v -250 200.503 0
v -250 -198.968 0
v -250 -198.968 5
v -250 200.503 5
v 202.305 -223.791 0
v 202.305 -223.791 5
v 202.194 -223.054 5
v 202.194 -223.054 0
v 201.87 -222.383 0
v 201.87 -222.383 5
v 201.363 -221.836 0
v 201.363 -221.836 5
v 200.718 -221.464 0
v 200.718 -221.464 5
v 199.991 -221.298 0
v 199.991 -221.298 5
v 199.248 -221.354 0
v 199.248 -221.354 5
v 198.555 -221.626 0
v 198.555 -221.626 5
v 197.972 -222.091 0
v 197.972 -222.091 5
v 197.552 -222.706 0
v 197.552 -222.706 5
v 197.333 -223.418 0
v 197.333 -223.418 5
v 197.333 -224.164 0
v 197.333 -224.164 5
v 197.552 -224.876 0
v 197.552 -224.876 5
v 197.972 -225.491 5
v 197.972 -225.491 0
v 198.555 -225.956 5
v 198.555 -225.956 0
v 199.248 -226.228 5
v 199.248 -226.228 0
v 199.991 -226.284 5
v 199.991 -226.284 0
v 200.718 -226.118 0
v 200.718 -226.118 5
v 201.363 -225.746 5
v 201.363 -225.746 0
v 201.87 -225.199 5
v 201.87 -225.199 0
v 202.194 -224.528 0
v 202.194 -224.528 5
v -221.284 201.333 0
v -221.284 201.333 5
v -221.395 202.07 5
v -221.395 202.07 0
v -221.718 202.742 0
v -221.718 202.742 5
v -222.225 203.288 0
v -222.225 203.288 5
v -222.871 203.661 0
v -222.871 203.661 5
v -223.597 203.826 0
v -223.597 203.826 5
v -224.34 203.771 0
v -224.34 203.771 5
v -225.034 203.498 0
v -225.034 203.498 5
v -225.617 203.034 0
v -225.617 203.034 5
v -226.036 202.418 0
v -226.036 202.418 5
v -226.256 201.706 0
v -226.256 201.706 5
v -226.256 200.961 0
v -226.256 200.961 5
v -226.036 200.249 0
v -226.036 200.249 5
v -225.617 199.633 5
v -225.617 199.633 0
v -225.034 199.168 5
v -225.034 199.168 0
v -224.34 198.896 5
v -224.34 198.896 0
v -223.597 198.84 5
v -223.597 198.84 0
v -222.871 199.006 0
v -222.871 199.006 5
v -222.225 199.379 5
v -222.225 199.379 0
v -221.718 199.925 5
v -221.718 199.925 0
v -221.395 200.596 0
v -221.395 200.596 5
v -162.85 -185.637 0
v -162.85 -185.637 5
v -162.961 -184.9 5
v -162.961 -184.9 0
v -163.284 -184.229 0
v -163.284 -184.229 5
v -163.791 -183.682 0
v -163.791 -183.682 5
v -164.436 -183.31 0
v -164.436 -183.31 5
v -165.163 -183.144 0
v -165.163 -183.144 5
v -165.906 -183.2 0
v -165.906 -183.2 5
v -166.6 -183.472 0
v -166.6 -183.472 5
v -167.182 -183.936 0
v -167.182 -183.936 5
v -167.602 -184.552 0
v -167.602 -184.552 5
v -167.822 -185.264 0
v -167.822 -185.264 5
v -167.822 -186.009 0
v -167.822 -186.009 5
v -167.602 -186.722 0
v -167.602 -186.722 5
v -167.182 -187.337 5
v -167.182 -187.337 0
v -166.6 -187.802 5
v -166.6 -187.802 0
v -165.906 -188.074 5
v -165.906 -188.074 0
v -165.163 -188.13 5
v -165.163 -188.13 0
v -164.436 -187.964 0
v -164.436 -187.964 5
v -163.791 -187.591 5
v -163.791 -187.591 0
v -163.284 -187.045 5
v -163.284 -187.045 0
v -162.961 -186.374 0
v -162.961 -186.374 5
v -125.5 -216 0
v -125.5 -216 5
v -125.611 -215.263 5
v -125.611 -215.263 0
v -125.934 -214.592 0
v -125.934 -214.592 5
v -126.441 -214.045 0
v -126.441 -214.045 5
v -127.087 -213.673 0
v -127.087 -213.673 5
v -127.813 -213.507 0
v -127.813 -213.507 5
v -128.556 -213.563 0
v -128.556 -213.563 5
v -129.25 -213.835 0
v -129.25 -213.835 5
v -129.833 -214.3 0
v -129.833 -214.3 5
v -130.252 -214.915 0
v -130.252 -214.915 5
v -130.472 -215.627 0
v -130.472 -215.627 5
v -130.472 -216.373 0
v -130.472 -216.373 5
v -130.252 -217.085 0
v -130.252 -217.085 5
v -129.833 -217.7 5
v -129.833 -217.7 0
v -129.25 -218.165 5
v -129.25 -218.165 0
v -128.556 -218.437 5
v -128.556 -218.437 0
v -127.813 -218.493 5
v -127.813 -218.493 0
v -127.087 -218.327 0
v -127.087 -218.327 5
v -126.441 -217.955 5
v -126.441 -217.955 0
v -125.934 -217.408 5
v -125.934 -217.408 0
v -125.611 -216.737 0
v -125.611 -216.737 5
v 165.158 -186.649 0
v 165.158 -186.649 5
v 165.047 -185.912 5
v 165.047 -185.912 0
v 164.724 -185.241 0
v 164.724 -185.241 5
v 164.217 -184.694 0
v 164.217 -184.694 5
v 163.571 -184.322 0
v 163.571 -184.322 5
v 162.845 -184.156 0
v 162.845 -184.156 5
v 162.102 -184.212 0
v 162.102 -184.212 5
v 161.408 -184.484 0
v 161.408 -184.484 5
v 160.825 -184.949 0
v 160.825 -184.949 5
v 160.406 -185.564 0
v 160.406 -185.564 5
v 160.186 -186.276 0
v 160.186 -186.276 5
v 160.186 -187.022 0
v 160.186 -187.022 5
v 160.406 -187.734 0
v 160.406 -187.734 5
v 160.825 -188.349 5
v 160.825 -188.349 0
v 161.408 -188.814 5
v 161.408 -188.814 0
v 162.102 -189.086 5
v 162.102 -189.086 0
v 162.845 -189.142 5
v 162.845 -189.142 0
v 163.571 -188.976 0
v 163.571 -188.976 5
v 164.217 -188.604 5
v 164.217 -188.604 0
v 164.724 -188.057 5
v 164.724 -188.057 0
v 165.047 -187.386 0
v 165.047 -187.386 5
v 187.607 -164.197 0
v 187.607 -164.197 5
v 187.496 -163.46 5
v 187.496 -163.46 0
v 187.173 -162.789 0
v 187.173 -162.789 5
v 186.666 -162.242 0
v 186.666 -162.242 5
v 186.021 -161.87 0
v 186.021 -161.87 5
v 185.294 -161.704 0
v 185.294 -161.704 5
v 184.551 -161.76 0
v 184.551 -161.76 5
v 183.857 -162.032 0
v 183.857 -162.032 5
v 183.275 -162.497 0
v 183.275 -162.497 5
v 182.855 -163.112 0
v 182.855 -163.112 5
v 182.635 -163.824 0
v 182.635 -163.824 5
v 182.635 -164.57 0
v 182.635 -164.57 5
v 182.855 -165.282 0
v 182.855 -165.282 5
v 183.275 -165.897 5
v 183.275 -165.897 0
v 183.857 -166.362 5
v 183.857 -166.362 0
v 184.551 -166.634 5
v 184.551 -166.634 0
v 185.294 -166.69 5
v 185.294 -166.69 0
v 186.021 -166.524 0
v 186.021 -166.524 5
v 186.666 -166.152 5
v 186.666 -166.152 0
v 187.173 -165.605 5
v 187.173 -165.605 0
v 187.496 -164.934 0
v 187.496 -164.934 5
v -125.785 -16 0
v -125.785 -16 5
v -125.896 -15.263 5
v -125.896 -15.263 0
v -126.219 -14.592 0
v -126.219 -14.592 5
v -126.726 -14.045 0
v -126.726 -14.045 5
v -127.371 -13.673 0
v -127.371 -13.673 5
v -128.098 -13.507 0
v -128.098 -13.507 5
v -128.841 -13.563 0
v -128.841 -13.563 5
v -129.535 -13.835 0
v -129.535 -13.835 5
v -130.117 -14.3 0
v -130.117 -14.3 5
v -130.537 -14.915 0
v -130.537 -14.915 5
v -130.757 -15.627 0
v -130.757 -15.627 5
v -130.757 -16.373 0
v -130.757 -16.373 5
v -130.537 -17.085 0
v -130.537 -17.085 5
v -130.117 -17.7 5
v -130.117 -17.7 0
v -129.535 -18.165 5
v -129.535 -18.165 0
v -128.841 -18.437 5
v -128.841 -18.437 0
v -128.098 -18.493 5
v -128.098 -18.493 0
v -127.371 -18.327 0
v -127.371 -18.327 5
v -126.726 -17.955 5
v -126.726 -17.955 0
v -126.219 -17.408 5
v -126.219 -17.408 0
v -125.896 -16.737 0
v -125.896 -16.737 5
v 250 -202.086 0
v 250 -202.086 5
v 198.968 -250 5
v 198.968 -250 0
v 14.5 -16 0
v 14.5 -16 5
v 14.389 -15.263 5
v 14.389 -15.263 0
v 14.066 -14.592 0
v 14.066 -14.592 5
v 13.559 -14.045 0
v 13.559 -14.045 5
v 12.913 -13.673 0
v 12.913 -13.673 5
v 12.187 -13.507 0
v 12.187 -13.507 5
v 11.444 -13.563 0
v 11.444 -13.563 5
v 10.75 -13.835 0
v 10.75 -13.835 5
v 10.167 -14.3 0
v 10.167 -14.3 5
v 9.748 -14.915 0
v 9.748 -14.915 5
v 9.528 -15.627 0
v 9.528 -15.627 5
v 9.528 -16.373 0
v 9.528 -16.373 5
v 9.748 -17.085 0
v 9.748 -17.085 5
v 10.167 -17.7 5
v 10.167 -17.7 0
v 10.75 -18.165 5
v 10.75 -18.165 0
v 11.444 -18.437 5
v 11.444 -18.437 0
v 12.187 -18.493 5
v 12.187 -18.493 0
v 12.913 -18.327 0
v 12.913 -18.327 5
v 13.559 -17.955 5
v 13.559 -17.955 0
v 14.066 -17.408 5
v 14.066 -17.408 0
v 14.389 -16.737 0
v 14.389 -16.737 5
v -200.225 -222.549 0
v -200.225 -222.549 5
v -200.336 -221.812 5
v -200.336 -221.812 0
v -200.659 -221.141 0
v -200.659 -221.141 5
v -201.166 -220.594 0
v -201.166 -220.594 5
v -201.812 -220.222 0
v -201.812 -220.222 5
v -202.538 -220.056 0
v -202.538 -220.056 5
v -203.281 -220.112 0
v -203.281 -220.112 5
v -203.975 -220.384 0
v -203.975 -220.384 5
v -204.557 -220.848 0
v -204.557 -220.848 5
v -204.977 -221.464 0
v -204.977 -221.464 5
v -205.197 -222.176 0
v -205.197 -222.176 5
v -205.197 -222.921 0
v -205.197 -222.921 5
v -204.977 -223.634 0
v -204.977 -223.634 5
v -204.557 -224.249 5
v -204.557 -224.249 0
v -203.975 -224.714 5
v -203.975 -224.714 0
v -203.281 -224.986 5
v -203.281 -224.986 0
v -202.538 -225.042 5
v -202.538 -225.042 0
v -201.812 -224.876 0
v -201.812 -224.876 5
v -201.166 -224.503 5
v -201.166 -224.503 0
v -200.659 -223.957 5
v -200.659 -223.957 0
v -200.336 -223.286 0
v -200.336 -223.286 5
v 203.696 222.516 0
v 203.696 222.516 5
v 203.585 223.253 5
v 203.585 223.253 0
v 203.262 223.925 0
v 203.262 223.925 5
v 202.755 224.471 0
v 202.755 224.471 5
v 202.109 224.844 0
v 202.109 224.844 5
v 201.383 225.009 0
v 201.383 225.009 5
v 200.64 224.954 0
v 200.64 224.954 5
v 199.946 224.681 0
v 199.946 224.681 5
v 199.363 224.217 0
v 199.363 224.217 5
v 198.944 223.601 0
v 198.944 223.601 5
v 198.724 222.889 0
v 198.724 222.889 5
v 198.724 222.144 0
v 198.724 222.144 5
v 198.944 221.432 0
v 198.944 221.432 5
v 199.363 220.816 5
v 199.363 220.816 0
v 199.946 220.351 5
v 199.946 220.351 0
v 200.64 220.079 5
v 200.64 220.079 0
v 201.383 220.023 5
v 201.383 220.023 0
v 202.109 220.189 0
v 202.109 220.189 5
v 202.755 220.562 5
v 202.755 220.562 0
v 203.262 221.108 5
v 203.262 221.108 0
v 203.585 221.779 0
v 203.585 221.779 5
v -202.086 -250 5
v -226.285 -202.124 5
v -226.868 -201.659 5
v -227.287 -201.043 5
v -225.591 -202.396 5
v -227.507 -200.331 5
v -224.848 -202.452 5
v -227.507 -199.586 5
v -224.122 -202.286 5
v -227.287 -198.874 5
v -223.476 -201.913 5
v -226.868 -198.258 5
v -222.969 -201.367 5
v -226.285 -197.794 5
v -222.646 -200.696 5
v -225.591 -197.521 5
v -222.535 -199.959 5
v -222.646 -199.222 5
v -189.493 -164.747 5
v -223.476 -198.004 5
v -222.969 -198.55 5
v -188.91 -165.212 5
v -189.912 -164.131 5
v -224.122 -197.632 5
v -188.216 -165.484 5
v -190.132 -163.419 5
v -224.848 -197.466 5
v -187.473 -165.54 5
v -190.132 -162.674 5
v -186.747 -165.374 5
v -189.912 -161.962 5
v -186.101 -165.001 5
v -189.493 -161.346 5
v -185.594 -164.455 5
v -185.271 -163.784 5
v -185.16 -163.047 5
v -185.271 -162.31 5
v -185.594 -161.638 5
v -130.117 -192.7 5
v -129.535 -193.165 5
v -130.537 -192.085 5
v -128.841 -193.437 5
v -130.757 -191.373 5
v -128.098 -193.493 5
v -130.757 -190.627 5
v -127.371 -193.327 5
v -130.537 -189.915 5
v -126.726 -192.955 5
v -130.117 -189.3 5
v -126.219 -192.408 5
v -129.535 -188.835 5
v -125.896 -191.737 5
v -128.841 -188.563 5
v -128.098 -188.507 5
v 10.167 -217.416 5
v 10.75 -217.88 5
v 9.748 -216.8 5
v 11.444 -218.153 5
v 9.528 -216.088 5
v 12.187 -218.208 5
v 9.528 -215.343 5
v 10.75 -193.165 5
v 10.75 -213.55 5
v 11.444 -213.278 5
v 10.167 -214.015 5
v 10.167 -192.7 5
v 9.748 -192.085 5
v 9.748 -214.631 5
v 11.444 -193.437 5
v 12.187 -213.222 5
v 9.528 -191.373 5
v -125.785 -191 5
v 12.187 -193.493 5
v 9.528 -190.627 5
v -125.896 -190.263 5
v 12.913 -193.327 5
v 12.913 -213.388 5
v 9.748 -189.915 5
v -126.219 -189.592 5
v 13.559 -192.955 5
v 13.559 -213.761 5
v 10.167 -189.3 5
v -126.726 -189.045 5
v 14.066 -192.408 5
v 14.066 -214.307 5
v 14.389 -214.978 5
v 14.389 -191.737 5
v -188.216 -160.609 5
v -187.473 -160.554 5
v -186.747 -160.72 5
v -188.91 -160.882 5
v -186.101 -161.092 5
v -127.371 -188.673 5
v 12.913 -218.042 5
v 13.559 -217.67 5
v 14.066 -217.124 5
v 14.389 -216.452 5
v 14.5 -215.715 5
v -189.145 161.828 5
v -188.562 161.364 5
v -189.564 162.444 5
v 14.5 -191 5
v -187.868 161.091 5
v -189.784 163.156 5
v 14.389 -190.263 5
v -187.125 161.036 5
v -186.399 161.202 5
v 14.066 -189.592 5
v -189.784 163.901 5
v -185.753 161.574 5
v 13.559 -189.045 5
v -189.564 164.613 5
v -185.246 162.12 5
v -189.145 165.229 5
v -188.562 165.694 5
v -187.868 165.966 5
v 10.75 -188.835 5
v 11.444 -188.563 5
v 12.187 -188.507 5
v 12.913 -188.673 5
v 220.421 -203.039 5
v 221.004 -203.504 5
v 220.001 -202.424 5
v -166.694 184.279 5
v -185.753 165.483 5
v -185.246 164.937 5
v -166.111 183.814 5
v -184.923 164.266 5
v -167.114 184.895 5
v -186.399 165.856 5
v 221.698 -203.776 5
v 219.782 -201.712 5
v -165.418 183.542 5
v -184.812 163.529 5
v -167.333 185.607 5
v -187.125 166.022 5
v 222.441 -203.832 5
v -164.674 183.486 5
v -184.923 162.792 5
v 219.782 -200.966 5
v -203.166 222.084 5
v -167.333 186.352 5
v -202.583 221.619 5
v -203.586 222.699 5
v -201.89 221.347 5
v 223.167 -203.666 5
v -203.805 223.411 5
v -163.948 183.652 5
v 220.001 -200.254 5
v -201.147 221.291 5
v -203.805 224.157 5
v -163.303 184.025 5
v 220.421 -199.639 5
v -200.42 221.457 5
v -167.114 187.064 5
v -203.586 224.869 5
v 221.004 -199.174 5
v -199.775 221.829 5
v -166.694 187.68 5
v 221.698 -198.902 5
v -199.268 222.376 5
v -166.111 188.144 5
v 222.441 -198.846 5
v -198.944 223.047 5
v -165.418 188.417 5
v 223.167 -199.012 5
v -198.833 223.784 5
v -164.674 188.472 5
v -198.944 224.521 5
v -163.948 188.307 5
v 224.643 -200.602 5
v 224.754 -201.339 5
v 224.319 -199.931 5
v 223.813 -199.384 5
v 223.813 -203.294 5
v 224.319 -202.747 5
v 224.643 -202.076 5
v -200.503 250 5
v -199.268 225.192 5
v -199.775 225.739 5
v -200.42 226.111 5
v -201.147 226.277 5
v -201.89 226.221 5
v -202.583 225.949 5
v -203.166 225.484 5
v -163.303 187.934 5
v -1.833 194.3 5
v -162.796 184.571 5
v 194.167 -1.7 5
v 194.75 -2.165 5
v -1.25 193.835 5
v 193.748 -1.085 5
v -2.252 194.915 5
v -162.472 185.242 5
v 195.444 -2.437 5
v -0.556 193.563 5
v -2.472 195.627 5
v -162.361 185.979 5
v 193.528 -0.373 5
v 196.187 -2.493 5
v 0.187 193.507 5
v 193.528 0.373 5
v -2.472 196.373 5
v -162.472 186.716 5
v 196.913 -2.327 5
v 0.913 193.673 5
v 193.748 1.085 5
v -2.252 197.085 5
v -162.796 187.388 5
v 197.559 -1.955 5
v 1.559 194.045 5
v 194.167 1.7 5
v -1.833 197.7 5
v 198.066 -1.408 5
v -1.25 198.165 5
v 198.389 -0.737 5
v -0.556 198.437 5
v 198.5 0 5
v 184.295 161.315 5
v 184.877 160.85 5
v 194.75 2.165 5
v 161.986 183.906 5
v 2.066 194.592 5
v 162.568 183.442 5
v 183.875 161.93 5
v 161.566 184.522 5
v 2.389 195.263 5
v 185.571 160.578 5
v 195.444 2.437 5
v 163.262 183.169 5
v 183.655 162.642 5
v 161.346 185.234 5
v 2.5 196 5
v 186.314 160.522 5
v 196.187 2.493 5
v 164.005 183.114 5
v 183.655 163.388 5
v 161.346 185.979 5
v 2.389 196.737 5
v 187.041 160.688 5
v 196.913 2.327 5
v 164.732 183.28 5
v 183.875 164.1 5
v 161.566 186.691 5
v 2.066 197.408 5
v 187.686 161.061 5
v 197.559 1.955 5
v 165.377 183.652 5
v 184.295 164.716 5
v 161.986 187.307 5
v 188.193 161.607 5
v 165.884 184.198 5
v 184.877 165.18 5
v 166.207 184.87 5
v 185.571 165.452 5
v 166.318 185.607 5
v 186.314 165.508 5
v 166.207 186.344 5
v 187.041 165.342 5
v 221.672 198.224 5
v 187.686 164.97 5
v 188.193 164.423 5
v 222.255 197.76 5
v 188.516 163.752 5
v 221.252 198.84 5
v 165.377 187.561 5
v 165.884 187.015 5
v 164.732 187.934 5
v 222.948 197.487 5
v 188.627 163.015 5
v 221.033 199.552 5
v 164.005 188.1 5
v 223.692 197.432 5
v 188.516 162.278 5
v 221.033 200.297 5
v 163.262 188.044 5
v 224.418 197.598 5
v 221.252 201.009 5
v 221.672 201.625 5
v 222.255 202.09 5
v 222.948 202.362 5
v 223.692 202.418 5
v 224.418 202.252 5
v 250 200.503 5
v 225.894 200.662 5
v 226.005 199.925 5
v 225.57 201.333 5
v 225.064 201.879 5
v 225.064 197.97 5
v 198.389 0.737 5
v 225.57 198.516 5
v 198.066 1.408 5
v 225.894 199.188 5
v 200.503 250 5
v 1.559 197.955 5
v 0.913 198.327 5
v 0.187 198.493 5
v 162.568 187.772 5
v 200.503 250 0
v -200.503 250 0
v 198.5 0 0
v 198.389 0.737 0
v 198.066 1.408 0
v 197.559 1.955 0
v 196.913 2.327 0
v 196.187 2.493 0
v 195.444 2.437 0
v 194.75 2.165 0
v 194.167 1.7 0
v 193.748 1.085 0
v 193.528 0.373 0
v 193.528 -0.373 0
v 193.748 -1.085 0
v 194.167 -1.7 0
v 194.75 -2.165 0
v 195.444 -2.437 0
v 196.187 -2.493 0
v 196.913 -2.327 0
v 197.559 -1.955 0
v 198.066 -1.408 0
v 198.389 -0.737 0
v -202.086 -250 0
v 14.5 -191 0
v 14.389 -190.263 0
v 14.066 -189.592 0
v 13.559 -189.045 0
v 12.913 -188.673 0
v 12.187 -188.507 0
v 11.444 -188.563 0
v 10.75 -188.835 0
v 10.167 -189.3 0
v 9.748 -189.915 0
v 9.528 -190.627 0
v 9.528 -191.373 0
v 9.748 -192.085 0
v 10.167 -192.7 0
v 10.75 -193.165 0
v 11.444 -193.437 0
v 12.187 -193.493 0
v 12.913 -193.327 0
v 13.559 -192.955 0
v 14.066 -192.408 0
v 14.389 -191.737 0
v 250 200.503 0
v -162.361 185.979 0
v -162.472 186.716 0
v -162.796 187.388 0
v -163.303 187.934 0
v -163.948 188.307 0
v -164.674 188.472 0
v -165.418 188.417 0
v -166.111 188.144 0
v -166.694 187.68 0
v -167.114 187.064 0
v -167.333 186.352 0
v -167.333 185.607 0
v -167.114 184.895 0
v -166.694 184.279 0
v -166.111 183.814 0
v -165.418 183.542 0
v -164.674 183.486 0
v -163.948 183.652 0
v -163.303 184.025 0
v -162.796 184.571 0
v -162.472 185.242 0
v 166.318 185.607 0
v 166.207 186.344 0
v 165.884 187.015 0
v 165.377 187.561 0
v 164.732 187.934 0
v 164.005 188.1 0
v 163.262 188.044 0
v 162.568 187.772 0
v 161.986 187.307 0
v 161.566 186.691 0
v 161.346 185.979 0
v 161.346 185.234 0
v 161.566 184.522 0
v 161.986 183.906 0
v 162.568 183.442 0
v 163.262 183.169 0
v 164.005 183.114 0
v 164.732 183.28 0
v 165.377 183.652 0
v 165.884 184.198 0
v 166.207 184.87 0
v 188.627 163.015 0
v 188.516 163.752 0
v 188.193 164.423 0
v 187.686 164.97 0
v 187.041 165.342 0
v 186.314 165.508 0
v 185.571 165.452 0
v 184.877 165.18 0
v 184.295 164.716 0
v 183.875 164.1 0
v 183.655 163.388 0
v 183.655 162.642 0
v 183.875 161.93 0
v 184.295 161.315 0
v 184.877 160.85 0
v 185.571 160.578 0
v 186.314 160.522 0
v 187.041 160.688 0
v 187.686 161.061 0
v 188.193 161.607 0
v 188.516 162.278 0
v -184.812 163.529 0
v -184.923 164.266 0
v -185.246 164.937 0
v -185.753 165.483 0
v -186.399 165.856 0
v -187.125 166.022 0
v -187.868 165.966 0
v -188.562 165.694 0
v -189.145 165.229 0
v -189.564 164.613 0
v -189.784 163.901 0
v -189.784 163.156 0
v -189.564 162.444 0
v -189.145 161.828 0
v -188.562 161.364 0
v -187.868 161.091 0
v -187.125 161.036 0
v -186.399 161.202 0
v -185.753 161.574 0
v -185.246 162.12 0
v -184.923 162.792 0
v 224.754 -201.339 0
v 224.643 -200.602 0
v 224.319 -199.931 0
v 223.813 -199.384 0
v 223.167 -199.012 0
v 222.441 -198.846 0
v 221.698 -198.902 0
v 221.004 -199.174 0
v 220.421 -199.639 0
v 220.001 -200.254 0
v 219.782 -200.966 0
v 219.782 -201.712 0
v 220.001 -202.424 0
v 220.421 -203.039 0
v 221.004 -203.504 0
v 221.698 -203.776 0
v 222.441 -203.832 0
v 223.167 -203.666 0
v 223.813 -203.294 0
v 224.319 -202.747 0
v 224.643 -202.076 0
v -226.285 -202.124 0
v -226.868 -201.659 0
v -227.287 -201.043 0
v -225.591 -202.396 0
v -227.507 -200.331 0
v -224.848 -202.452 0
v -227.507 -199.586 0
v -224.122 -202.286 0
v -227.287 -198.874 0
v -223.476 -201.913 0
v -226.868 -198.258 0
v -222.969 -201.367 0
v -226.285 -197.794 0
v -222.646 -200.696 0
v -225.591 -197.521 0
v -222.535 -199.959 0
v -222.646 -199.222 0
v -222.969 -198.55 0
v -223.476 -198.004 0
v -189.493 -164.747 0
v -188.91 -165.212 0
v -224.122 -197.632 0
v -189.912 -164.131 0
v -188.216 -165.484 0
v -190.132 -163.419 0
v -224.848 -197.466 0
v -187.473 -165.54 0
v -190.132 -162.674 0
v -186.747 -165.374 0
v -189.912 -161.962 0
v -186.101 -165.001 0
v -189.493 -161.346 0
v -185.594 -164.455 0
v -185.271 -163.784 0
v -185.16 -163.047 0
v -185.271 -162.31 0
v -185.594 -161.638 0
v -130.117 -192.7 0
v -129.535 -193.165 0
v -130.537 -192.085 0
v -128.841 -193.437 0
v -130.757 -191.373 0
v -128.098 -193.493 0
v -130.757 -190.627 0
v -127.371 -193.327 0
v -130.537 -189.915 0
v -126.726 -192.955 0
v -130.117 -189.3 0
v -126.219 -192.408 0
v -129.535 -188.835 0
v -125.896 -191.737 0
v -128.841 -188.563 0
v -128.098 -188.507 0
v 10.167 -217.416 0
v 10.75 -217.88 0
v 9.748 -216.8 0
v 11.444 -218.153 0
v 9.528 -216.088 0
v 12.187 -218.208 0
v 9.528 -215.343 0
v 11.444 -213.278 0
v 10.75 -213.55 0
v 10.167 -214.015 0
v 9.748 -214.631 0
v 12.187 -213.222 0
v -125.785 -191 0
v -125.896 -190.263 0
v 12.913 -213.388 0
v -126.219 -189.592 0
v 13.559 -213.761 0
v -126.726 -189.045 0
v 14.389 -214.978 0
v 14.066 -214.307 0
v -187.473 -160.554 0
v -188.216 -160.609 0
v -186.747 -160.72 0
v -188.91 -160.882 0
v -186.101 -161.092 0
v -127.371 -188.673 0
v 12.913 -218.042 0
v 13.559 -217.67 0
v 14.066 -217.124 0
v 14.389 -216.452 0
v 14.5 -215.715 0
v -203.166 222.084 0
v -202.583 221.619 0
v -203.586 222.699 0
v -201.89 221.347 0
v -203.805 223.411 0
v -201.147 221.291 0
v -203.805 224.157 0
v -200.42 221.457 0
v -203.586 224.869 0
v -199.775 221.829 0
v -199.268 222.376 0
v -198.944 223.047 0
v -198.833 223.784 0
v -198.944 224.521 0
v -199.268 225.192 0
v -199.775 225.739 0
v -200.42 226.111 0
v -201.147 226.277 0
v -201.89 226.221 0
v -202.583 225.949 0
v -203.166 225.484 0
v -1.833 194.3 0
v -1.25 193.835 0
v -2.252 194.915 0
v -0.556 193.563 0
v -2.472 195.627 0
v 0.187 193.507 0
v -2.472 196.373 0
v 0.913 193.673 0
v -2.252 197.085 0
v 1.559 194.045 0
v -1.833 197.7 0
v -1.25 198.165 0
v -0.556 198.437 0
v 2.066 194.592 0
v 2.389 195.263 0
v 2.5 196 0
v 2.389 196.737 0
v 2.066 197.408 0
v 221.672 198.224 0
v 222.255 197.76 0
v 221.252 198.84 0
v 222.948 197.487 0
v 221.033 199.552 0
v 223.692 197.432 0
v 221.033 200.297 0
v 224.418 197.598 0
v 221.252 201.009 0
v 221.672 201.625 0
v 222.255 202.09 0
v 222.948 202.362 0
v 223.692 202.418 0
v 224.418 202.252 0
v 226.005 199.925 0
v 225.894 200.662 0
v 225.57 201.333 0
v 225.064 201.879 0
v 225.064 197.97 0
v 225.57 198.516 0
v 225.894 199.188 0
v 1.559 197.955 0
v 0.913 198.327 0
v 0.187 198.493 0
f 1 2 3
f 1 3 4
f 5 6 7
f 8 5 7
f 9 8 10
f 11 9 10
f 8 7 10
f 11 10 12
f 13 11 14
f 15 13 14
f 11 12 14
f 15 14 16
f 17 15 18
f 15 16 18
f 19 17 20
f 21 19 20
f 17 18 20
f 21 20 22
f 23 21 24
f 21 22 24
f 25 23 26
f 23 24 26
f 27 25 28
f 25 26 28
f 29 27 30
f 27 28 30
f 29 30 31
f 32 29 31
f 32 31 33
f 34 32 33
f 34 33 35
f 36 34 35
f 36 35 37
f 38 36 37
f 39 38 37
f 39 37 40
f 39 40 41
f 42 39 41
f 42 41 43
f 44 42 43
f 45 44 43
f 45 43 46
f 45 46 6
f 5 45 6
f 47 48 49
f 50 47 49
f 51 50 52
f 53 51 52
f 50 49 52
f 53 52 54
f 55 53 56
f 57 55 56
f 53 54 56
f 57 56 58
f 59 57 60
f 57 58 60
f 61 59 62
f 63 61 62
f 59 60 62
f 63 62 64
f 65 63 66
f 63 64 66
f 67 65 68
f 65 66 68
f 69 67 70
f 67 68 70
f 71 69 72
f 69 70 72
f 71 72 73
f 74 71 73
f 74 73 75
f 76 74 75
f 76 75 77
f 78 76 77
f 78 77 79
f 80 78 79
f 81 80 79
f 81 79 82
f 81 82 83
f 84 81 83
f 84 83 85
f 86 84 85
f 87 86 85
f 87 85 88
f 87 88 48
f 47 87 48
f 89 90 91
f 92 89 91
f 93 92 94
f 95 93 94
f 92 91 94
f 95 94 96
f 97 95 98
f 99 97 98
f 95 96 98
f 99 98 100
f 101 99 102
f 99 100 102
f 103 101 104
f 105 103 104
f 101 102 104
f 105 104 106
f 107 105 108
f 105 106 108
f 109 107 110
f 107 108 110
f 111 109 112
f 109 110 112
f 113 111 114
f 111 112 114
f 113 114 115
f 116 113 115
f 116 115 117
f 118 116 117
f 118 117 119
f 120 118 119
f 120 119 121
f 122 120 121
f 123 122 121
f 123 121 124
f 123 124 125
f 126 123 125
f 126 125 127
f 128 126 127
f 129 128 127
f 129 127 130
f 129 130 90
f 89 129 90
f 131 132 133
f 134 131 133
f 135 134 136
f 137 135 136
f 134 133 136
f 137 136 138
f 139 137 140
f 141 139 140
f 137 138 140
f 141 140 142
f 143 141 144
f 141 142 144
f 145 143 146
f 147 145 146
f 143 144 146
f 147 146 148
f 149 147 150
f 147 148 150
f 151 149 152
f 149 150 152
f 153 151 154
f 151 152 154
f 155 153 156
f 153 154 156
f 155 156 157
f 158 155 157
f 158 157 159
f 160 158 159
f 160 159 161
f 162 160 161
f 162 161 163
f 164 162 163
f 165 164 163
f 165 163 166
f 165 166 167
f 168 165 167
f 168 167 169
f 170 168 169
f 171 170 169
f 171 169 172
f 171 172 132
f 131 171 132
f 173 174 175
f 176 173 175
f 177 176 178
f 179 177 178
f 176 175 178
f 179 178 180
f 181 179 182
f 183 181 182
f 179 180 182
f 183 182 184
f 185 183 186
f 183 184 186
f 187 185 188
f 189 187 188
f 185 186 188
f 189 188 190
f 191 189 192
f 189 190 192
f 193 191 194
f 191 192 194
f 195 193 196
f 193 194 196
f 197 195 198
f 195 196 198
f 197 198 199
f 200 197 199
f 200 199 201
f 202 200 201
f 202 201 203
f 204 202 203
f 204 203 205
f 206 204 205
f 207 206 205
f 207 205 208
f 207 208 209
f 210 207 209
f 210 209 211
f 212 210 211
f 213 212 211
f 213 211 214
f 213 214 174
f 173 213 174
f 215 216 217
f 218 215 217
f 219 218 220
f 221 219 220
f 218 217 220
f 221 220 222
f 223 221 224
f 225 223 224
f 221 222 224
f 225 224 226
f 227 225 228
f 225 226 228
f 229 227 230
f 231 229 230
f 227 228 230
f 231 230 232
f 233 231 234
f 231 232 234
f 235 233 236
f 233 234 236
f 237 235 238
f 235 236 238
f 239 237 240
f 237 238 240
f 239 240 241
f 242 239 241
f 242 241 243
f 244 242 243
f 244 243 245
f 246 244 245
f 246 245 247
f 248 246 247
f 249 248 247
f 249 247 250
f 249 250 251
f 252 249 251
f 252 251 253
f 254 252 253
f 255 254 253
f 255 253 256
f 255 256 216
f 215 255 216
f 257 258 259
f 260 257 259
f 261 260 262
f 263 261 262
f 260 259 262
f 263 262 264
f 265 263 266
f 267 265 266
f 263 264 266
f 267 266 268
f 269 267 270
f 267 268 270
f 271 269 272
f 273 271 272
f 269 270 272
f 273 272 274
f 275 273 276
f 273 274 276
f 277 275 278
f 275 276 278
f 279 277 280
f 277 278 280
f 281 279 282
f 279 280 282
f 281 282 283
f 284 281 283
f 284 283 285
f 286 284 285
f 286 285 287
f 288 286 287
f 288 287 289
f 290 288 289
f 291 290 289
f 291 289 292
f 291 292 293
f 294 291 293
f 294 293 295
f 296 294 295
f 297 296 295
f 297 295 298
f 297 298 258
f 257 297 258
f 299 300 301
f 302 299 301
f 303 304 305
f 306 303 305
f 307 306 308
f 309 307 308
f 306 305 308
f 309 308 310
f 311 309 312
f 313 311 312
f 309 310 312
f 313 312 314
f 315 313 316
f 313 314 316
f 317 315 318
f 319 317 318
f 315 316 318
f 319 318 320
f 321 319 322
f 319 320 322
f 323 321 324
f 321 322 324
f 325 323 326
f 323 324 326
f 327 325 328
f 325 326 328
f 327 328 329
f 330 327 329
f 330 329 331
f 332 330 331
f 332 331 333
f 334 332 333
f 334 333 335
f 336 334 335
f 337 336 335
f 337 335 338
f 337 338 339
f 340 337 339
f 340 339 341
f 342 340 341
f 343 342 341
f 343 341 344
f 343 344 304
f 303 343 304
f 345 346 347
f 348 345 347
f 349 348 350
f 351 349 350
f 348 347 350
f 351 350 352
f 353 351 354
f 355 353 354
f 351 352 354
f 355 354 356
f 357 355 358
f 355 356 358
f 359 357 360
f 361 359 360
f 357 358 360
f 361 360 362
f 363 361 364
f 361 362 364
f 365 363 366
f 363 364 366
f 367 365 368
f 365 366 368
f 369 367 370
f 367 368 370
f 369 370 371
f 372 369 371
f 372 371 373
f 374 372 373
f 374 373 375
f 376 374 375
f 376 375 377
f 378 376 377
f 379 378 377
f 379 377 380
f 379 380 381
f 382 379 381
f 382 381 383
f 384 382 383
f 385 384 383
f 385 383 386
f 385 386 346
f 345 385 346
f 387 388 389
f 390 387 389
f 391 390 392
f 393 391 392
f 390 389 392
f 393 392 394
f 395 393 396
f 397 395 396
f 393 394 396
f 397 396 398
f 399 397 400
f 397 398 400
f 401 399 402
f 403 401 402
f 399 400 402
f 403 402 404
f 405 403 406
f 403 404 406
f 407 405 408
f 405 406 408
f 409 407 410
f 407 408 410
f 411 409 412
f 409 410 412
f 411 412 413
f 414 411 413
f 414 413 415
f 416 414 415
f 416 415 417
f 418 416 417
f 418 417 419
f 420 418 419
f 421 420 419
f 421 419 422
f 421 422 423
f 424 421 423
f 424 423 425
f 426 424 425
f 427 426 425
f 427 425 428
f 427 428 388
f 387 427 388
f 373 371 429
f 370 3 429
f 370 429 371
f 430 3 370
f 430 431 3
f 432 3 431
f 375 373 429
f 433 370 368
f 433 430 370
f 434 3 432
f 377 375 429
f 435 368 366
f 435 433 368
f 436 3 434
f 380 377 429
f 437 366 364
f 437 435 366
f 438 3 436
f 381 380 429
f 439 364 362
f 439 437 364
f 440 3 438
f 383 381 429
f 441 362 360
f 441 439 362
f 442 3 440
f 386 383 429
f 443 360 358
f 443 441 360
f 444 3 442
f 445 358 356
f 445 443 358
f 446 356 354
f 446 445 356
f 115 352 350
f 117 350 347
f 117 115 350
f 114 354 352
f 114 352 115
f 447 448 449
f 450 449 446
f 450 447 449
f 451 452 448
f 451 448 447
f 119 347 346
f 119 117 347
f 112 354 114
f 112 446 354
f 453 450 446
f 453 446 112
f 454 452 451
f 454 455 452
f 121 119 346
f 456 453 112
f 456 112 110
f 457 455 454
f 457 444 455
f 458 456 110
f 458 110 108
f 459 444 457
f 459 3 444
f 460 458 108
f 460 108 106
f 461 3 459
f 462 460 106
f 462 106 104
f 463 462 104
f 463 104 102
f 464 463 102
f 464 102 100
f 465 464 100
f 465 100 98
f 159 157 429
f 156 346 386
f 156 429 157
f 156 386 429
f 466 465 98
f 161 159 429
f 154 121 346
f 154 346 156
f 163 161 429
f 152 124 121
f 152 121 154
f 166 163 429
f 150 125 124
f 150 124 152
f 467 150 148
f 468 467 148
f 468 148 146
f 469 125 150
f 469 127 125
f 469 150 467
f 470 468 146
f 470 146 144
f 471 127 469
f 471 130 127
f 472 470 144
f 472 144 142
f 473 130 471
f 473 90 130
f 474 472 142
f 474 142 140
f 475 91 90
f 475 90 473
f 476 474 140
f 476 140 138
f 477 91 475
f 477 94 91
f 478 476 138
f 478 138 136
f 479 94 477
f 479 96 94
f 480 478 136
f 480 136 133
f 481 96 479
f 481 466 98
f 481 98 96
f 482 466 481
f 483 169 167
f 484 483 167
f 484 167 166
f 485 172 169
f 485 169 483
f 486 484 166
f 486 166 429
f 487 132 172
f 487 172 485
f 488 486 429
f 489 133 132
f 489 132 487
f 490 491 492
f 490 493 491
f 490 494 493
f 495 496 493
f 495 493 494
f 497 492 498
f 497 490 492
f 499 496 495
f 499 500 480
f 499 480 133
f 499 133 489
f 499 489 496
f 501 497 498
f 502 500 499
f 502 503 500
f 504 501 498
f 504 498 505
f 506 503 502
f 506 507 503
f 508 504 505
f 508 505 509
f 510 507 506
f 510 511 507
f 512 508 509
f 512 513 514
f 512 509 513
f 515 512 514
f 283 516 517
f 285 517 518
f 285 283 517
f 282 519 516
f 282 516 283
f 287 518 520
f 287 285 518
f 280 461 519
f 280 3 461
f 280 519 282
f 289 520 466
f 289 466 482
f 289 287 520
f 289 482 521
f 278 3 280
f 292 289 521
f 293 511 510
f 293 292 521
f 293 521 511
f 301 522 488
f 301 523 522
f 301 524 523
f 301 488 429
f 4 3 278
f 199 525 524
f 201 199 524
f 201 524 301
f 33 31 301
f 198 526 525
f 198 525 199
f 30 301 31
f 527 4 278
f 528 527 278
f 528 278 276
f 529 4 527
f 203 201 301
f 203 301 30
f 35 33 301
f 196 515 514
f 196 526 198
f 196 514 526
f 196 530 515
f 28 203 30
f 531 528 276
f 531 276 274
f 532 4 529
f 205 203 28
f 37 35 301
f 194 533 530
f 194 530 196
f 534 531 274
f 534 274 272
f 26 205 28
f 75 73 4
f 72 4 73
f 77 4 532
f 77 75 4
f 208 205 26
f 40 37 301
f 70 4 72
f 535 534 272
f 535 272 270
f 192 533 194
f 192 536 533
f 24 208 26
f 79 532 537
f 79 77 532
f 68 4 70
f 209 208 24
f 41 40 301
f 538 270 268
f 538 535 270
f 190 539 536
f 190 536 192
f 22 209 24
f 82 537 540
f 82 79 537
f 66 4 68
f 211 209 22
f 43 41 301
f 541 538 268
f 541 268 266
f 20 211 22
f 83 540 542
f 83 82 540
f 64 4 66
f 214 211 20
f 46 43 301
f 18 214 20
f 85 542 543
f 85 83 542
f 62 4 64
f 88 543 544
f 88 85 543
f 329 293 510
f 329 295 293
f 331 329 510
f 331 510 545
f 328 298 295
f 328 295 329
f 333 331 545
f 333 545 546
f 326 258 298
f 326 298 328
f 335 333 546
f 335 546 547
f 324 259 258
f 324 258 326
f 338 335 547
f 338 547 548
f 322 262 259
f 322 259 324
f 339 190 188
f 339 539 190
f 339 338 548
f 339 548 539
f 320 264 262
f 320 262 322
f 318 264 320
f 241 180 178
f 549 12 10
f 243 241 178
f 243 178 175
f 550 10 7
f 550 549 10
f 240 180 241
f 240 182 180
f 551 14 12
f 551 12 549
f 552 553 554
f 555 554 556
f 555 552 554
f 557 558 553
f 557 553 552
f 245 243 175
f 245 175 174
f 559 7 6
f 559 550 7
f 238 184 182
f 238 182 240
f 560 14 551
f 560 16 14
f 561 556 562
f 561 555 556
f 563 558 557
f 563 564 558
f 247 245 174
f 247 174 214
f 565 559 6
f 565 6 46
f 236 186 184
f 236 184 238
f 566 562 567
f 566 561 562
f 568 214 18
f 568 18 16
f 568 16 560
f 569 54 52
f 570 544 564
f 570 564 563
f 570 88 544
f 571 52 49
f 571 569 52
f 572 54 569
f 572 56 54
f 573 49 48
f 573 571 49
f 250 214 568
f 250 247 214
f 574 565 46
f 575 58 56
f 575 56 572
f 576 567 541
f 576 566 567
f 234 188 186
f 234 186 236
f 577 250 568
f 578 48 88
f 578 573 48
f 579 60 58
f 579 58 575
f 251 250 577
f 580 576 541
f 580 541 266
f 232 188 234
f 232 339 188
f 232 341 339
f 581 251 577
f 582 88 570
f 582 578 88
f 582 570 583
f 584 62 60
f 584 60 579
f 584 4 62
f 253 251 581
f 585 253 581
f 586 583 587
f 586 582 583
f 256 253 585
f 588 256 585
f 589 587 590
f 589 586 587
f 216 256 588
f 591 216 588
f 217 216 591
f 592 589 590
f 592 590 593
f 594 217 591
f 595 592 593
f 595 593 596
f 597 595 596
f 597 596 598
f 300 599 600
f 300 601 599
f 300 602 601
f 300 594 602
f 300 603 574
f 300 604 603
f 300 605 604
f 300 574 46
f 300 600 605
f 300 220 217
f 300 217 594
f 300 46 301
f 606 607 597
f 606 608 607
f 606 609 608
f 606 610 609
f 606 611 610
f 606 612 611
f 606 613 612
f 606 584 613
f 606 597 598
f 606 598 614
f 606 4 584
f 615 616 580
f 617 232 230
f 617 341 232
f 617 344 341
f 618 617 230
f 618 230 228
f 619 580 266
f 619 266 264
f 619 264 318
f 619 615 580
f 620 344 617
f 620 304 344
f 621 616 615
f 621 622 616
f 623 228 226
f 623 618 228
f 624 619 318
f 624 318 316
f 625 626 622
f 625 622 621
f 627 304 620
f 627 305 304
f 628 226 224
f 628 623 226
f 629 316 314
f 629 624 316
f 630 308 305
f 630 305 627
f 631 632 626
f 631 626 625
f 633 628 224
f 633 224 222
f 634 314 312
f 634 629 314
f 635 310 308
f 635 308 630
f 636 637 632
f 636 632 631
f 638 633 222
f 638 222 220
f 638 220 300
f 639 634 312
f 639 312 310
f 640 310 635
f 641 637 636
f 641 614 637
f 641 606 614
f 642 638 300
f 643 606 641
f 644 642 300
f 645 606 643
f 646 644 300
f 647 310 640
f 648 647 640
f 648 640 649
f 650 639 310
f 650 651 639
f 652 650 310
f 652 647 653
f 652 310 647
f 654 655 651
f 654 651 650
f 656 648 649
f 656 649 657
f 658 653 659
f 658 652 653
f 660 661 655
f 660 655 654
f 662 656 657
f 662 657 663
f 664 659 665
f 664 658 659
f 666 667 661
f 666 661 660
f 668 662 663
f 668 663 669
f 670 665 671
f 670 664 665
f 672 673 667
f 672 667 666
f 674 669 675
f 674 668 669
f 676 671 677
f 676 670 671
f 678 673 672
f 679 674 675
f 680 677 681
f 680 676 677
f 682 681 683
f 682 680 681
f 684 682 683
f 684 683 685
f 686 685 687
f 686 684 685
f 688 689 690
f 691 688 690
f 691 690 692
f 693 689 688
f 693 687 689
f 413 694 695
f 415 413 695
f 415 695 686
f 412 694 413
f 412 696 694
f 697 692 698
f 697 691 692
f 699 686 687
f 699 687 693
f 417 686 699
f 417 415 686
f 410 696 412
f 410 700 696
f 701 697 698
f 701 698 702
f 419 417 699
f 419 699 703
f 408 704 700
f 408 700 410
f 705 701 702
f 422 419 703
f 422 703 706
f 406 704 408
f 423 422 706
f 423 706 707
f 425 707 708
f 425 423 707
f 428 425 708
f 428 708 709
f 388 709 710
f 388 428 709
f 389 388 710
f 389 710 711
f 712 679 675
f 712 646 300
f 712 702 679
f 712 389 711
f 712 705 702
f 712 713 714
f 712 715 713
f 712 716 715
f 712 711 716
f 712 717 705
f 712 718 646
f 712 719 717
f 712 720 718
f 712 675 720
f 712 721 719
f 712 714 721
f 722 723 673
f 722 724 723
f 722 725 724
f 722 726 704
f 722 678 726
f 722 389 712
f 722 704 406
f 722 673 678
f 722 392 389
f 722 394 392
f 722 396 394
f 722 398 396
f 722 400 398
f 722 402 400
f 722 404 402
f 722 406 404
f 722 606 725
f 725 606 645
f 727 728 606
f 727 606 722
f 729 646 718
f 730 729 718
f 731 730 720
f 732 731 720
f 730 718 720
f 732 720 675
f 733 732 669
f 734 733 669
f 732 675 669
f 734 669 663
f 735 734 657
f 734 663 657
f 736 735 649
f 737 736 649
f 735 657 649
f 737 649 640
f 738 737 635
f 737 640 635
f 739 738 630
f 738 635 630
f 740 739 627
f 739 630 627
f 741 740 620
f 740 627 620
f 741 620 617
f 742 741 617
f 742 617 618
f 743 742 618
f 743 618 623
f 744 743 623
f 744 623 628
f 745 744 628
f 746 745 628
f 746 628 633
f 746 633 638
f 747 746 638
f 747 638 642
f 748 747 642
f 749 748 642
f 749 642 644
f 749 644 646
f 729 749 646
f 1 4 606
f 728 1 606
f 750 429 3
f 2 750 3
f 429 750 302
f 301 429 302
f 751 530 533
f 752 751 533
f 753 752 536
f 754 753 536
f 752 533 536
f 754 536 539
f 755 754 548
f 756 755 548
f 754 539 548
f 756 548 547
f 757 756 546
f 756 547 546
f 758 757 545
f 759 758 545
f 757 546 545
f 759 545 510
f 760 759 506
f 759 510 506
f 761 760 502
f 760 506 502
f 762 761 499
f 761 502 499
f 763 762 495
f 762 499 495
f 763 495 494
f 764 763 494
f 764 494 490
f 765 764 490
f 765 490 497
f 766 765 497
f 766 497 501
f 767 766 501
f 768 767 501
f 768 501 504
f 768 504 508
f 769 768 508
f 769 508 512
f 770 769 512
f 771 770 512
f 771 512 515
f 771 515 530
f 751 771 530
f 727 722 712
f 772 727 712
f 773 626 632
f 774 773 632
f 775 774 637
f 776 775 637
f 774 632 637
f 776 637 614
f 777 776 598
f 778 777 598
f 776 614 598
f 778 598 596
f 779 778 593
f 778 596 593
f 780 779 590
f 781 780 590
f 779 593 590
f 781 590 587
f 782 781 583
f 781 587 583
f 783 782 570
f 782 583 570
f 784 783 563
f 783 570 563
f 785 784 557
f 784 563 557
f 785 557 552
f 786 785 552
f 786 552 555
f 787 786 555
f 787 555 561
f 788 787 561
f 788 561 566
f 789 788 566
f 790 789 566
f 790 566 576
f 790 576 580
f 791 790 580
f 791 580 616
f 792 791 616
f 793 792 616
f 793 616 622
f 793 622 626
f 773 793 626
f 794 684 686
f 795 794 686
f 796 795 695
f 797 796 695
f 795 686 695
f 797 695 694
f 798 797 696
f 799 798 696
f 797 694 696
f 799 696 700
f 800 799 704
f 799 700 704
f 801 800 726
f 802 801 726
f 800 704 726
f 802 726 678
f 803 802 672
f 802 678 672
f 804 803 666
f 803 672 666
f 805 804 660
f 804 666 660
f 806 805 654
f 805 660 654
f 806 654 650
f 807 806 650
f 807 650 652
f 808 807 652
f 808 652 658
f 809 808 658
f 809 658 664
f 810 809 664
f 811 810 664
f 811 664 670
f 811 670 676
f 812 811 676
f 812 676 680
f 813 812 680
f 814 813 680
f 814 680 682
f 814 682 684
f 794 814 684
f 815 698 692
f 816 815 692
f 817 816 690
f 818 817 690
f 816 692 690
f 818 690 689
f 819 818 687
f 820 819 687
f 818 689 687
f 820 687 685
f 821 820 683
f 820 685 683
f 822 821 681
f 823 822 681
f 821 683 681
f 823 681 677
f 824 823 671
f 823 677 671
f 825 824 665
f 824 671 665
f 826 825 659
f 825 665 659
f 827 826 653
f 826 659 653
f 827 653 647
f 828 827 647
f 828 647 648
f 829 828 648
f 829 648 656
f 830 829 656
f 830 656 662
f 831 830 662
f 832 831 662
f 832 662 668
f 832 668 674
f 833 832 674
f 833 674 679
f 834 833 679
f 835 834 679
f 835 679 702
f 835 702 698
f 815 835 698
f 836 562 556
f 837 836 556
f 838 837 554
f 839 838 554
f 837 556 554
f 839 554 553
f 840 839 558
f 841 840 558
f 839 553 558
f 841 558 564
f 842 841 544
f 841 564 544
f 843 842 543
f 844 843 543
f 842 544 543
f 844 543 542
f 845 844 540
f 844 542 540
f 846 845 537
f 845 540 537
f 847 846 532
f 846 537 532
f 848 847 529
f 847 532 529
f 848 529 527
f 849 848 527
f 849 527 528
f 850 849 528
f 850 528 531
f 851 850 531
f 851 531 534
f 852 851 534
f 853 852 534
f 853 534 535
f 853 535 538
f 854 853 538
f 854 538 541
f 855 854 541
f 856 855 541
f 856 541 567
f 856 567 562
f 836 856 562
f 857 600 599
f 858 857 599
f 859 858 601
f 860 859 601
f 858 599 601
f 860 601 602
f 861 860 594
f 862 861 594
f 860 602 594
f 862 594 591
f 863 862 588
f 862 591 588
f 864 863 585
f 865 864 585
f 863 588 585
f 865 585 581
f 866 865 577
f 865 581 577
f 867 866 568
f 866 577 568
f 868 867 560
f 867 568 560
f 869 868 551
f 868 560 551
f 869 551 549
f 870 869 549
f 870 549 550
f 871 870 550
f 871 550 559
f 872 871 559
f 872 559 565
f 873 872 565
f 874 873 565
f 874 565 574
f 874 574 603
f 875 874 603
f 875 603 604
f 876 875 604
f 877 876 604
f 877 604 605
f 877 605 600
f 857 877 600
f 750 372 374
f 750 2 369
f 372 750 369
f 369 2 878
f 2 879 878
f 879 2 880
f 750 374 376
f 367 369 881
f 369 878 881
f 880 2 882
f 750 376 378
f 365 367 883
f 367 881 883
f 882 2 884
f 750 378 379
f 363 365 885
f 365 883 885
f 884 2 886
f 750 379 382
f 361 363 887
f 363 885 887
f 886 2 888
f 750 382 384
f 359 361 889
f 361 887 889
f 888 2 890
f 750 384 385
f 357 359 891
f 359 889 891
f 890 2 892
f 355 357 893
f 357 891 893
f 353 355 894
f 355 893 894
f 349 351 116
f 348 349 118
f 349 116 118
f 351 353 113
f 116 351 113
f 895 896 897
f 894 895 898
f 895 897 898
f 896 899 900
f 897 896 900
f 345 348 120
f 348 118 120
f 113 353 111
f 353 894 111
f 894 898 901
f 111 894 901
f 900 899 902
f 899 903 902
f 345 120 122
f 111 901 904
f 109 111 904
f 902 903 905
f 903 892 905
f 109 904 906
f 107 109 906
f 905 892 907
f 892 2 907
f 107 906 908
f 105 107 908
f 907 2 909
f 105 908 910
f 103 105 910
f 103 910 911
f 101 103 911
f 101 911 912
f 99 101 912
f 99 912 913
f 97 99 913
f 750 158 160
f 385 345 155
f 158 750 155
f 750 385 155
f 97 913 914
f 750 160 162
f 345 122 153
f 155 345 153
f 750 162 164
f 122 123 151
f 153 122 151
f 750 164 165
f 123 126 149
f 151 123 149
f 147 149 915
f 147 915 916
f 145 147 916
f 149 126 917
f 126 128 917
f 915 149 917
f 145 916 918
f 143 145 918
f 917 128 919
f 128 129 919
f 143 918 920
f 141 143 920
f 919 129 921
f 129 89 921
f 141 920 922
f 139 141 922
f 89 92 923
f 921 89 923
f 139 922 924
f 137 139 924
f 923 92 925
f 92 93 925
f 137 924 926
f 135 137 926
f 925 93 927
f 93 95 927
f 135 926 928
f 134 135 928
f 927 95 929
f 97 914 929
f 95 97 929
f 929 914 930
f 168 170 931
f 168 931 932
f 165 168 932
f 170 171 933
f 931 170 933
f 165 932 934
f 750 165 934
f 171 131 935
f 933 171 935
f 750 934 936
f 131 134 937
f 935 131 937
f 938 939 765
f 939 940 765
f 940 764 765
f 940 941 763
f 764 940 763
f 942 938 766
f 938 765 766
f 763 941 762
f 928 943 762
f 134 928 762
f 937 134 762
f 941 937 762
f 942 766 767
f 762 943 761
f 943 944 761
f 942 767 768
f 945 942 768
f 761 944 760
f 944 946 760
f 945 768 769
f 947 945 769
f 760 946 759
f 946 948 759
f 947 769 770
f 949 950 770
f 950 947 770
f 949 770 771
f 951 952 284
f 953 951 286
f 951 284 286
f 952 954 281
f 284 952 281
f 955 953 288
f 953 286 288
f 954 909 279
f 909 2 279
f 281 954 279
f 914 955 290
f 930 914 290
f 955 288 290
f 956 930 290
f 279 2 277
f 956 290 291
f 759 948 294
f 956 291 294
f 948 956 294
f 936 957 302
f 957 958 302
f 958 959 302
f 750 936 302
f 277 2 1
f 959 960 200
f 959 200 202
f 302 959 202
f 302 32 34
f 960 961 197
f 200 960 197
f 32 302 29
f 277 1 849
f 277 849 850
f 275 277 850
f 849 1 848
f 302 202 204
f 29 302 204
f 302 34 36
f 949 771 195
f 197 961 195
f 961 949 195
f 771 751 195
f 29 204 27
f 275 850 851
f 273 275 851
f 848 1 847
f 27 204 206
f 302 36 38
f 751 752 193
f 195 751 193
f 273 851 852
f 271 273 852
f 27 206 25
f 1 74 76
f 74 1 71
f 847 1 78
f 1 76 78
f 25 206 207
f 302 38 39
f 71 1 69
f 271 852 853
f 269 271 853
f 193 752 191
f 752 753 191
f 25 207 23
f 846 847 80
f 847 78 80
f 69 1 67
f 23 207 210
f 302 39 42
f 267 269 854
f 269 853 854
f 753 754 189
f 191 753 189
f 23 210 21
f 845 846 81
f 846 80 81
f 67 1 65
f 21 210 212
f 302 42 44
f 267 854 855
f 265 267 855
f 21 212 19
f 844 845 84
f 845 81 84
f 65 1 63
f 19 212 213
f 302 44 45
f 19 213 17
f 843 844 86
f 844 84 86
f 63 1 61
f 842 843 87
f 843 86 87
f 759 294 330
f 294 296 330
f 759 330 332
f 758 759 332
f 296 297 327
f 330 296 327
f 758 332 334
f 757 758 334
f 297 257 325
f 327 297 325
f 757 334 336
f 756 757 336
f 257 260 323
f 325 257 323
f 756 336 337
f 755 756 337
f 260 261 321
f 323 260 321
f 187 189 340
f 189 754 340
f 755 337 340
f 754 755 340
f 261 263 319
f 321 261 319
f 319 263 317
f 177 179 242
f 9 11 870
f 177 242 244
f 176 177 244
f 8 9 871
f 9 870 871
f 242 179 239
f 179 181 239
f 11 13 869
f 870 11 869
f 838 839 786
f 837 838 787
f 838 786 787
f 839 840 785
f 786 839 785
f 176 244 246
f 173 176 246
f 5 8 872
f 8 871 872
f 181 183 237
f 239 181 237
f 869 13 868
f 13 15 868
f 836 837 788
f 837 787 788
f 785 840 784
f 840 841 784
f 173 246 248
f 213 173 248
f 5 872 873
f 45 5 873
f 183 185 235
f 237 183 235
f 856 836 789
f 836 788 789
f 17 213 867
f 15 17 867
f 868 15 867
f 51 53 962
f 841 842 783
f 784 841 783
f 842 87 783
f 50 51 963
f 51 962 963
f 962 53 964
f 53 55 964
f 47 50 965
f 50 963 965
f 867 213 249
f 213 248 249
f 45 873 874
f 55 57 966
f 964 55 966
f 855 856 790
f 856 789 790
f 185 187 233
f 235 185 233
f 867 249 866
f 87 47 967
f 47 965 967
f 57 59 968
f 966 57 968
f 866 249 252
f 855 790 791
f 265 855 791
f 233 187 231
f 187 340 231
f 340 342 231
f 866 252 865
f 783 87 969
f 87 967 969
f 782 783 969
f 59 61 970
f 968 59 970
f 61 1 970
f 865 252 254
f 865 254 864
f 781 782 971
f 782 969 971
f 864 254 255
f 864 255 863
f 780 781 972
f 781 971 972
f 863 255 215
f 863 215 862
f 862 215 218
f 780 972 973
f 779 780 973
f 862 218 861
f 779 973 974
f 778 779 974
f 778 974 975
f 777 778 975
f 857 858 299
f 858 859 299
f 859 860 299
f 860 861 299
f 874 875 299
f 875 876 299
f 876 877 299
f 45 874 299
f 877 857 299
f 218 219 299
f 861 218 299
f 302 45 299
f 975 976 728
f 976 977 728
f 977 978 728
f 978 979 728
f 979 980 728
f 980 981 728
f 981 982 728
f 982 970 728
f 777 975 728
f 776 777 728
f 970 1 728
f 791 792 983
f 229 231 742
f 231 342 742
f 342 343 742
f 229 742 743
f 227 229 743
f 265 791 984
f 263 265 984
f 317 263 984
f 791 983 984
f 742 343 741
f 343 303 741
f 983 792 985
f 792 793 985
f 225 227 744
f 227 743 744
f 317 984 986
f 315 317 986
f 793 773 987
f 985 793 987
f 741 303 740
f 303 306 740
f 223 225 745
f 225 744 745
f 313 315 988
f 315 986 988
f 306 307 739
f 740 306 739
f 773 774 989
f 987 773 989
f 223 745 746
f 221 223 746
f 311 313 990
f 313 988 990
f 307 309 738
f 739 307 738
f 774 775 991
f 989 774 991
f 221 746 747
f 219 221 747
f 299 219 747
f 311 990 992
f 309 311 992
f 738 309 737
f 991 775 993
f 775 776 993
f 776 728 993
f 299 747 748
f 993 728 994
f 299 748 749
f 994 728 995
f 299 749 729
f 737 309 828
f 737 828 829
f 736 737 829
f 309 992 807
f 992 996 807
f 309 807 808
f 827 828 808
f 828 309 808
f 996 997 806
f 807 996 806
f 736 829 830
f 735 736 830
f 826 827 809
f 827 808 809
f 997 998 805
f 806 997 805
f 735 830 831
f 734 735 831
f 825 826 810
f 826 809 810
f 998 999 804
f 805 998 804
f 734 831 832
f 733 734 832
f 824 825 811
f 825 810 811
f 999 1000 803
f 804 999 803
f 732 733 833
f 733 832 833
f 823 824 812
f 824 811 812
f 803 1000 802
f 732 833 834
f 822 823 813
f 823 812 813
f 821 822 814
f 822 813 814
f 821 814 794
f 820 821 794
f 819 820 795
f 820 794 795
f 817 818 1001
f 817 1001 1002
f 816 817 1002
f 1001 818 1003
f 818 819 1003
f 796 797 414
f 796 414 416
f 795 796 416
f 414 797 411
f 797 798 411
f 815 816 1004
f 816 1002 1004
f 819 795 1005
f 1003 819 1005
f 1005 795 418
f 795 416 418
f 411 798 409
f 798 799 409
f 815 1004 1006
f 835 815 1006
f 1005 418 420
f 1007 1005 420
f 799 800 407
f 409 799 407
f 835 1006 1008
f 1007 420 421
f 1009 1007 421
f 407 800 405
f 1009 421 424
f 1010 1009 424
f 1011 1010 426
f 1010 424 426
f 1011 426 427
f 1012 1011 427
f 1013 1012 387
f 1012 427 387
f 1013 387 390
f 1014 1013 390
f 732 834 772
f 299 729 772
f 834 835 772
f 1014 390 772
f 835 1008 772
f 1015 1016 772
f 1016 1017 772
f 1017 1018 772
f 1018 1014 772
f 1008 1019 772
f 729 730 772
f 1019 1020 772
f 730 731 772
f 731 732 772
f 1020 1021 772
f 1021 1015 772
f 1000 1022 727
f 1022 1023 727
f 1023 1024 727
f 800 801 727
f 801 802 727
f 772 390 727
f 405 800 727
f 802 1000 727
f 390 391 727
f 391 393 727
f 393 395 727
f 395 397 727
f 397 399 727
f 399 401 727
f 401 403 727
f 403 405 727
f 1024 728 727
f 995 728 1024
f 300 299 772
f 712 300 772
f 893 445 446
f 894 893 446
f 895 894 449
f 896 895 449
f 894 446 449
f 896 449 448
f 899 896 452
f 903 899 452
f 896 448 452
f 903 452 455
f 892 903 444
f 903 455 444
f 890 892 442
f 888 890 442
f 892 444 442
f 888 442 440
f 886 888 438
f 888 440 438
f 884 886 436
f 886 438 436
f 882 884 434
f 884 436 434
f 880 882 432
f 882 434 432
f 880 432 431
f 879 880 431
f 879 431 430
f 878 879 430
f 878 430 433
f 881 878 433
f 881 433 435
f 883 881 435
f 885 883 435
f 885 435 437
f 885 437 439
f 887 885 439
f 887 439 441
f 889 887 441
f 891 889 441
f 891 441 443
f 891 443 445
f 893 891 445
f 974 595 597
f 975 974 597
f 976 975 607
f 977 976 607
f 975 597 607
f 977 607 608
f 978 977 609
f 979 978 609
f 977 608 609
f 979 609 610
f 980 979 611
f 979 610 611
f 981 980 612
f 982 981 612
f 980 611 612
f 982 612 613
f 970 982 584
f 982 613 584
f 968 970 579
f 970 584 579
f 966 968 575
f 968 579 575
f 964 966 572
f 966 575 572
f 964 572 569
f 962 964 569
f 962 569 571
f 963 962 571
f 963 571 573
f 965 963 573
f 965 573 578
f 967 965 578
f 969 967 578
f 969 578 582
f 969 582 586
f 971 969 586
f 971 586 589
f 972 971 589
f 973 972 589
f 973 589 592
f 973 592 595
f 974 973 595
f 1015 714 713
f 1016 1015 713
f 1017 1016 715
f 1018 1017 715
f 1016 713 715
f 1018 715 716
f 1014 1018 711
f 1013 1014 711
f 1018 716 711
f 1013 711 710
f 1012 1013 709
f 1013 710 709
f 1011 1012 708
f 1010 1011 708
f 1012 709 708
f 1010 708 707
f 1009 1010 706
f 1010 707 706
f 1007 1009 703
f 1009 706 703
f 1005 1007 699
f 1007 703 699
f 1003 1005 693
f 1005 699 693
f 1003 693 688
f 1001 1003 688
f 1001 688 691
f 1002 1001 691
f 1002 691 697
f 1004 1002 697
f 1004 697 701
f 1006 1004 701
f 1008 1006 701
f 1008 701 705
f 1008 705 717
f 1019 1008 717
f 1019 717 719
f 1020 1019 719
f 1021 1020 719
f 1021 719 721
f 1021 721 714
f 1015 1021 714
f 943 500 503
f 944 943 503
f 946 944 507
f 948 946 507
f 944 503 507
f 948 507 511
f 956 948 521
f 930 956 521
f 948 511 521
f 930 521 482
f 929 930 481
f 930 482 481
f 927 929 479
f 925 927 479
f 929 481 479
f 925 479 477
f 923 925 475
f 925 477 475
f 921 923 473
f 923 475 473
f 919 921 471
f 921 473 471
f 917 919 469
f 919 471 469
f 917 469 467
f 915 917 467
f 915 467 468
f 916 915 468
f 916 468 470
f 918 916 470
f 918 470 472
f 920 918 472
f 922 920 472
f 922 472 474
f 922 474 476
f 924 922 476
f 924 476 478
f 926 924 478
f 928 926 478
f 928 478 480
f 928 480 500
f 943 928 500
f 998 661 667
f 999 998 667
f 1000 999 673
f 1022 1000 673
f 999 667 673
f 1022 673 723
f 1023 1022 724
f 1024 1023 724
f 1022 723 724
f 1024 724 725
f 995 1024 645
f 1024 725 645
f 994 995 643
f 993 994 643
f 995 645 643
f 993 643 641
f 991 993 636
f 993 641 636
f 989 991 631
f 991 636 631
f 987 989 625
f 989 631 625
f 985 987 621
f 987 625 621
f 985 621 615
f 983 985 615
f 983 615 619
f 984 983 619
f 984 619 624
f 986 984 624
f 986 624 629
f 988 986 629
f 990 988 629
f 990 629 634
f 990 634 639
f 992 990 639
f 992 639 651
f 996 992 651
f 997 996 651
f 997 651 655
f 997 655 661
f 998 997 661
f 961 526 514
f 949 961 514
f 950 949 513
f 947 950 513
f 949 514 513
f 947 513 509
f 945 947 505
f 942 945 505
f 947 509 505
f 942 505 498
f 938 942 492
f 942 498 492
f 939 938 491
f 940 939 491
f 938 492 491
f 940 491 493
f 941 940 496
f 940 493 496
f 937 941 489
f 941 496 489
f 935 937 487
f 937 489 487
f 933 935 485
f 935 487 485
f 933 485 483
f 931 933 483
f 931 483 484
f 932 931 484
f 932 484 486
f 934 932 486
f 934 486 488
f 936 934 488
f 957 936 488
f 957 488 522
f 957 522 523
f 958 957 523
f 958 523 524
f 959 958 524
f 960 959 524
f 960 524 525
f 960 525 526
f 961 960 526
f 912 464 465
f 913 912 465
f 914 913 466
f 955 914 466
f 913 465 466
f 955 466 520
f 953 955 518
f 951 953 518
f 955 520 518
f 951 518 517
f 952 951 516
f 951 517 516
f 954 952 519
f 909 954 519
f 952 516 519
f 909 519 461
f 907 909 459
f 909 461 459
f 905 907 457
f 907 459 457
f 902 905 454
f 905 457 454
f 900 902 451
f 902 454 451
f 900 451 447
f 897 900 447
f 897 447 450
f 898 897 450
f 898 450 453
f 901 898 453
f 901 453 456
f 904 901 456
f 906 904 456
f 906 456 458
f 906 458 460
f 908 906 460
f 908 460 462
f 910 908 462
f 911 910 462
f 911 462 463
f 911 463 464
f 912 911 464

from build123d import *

# Parameters (mm, degrees)
SKETCH2_W           = 500
SKETCH2_H           = 500
BOSS_EXTRUDE1_DEPTH = 5
CUT_EXTRUDE1_DEPTH  = 5
SKETCH4_R           = 2.5
CUT_EXTRUDE4_DEPTH  = 6
SKETCH6_R           = 2.5
CUT_EXTRUDE5_DEPTH  = 6
SKETCH6_3_R         = 2.5
CUT_EXTRUDE6_DEPTH  = 6
SKETCH7_R           = 2.5
CUT_EXTRUDE7_DEPTH  = 6


with BuildPart() as part:
    # Sketch2 → Boss-Extrude1 (new body)
    with BuildSketch(Plane.XY):
        Rectangle(SKETCH2_W, SKETCH2_H)
    extrude(amount=BOSS_EXTRUDE1_DEPTH)

    # Sketch3 → Cut-Extrude1 (cut)
    with BuildSketch(Plane.XY.offset(5)):
        Polygon((-250, 250), (-250, 200.502525317), (-200.502525317, 250), align=None)
        Polygon((250, 250), (200.502525317, 250), (250, 200.502525317), align=None)
        Polygon((250, -202.085866883), (198.968285864, -250), (250, -250), align=None)
        Polygon((-202.085866883, -250), (-250, -198.968285864), (-250, -250), align=None)
    extrude(amount=-CUT_EXTRUDE1_DEPTH, mode=Mode.SUBTRACT)

    # Sketch4 → Cut-Extrude4 (cut, through all)
    with BuildSketch(Plane.XY.offset(5)):
        with Locations((-223.784016088, 201.333375785)):
            Circle(SKETCH4_R)
        with Locations((-201.333375785, 223.784016088)):
            Circle(SKETCH4_R)
        with Locations((-187.311960925, 163.528745219)):
            Circle(SKETCH4_R)
        with Locations((201.196010764, 222.516316525)):
            Circle(SKETCH4_R)
        with Locations((223.504797991, 199.924713826)):
            Circle(SKETCH4_R)
        with Locations((163.81847093, 185.606691548)):
            Circle(SKETCH4_R)
        with Locations((199.804611485, -223.79101951)):
            Circle(SKETCH4_R)
        with Locations((222.253825998, -201.338953508)):
            Circle(SKETCH4_R)
        with Locations((-187.65988085, -163.046698367)):
            Circle(SKETCH4_R)
        with Locations((-165.349658973, -185.636884284)):
            Circle(SKETCH4_R)
        with Locations((-225.035076637, -199.958696957)):
            Circle(SKETCH4_R)
        with Locations((-202.724854759, -222.548882874)):
            Circle(SKETCH4_R)
        with Locations((-164.861320622, 185.979385522)):
            Circle(SKETCH4_R)
        with Locations((186.127258156, 163.01508885)):
            Circle(SKETCH4_R)
        with Locations((185.10714798, -164.196993245)):
            Circle(SKETCH4_R)
        with Locations((162.657933466, -186.649059247)):
            Circle(SKETCH4_R)
    extrude(amount=-CUT_EXTRUDE4_DEPTH, mode=Mode.SUBTRACT)

    # Sketch6 → Cut-Extrude5 (cut, through all)
    with BuildSketch(Plane.XY.offset(5)):
        with Locations((-128, -216)):
            Circle(SKETCH6_R)
        with Locations((-128.2846398, -191)):
            Circle(SKETCH6_R)
        with Locations((-128.2846398, -16)):
            Circle(SKETCH6_R)
    extrude(amount=-CUT_EXTRUDE5_DEPTH, mode=Mode.SUBTRACT)

    # Sketch6<3> → Cut-Extrude6 (cut, through all)
    with BuildSketch(Plane.XY.offset(5)):
        with Locations((12, -215.71527189)):
            Circle(SKETCH6_3_R)
        with Locations((12, -191)):
            Circle(SKETCH6_3_R)
        with Locations((12, -16)):
            Circle(SKETCH6_3_R)
    extrude(amount=-CUT_EXTRUDE6_DEPTH, mode=Mode.SUBTRACT)

    # Sketch7 → Cut-Extrude7 (cut, through all)
    with BuildSketch(Plane.XY.offset(5)):
        with Locations((0, 196)):
            Circle(SKETCH7_R)
        with Locations((196, 0)):
            Circle(SKETCH7_R)
    extrude(amount=-CUT_EXTRUDE7_DEPTH, mode=Mode.SUBTRACT)


solid = part.part
